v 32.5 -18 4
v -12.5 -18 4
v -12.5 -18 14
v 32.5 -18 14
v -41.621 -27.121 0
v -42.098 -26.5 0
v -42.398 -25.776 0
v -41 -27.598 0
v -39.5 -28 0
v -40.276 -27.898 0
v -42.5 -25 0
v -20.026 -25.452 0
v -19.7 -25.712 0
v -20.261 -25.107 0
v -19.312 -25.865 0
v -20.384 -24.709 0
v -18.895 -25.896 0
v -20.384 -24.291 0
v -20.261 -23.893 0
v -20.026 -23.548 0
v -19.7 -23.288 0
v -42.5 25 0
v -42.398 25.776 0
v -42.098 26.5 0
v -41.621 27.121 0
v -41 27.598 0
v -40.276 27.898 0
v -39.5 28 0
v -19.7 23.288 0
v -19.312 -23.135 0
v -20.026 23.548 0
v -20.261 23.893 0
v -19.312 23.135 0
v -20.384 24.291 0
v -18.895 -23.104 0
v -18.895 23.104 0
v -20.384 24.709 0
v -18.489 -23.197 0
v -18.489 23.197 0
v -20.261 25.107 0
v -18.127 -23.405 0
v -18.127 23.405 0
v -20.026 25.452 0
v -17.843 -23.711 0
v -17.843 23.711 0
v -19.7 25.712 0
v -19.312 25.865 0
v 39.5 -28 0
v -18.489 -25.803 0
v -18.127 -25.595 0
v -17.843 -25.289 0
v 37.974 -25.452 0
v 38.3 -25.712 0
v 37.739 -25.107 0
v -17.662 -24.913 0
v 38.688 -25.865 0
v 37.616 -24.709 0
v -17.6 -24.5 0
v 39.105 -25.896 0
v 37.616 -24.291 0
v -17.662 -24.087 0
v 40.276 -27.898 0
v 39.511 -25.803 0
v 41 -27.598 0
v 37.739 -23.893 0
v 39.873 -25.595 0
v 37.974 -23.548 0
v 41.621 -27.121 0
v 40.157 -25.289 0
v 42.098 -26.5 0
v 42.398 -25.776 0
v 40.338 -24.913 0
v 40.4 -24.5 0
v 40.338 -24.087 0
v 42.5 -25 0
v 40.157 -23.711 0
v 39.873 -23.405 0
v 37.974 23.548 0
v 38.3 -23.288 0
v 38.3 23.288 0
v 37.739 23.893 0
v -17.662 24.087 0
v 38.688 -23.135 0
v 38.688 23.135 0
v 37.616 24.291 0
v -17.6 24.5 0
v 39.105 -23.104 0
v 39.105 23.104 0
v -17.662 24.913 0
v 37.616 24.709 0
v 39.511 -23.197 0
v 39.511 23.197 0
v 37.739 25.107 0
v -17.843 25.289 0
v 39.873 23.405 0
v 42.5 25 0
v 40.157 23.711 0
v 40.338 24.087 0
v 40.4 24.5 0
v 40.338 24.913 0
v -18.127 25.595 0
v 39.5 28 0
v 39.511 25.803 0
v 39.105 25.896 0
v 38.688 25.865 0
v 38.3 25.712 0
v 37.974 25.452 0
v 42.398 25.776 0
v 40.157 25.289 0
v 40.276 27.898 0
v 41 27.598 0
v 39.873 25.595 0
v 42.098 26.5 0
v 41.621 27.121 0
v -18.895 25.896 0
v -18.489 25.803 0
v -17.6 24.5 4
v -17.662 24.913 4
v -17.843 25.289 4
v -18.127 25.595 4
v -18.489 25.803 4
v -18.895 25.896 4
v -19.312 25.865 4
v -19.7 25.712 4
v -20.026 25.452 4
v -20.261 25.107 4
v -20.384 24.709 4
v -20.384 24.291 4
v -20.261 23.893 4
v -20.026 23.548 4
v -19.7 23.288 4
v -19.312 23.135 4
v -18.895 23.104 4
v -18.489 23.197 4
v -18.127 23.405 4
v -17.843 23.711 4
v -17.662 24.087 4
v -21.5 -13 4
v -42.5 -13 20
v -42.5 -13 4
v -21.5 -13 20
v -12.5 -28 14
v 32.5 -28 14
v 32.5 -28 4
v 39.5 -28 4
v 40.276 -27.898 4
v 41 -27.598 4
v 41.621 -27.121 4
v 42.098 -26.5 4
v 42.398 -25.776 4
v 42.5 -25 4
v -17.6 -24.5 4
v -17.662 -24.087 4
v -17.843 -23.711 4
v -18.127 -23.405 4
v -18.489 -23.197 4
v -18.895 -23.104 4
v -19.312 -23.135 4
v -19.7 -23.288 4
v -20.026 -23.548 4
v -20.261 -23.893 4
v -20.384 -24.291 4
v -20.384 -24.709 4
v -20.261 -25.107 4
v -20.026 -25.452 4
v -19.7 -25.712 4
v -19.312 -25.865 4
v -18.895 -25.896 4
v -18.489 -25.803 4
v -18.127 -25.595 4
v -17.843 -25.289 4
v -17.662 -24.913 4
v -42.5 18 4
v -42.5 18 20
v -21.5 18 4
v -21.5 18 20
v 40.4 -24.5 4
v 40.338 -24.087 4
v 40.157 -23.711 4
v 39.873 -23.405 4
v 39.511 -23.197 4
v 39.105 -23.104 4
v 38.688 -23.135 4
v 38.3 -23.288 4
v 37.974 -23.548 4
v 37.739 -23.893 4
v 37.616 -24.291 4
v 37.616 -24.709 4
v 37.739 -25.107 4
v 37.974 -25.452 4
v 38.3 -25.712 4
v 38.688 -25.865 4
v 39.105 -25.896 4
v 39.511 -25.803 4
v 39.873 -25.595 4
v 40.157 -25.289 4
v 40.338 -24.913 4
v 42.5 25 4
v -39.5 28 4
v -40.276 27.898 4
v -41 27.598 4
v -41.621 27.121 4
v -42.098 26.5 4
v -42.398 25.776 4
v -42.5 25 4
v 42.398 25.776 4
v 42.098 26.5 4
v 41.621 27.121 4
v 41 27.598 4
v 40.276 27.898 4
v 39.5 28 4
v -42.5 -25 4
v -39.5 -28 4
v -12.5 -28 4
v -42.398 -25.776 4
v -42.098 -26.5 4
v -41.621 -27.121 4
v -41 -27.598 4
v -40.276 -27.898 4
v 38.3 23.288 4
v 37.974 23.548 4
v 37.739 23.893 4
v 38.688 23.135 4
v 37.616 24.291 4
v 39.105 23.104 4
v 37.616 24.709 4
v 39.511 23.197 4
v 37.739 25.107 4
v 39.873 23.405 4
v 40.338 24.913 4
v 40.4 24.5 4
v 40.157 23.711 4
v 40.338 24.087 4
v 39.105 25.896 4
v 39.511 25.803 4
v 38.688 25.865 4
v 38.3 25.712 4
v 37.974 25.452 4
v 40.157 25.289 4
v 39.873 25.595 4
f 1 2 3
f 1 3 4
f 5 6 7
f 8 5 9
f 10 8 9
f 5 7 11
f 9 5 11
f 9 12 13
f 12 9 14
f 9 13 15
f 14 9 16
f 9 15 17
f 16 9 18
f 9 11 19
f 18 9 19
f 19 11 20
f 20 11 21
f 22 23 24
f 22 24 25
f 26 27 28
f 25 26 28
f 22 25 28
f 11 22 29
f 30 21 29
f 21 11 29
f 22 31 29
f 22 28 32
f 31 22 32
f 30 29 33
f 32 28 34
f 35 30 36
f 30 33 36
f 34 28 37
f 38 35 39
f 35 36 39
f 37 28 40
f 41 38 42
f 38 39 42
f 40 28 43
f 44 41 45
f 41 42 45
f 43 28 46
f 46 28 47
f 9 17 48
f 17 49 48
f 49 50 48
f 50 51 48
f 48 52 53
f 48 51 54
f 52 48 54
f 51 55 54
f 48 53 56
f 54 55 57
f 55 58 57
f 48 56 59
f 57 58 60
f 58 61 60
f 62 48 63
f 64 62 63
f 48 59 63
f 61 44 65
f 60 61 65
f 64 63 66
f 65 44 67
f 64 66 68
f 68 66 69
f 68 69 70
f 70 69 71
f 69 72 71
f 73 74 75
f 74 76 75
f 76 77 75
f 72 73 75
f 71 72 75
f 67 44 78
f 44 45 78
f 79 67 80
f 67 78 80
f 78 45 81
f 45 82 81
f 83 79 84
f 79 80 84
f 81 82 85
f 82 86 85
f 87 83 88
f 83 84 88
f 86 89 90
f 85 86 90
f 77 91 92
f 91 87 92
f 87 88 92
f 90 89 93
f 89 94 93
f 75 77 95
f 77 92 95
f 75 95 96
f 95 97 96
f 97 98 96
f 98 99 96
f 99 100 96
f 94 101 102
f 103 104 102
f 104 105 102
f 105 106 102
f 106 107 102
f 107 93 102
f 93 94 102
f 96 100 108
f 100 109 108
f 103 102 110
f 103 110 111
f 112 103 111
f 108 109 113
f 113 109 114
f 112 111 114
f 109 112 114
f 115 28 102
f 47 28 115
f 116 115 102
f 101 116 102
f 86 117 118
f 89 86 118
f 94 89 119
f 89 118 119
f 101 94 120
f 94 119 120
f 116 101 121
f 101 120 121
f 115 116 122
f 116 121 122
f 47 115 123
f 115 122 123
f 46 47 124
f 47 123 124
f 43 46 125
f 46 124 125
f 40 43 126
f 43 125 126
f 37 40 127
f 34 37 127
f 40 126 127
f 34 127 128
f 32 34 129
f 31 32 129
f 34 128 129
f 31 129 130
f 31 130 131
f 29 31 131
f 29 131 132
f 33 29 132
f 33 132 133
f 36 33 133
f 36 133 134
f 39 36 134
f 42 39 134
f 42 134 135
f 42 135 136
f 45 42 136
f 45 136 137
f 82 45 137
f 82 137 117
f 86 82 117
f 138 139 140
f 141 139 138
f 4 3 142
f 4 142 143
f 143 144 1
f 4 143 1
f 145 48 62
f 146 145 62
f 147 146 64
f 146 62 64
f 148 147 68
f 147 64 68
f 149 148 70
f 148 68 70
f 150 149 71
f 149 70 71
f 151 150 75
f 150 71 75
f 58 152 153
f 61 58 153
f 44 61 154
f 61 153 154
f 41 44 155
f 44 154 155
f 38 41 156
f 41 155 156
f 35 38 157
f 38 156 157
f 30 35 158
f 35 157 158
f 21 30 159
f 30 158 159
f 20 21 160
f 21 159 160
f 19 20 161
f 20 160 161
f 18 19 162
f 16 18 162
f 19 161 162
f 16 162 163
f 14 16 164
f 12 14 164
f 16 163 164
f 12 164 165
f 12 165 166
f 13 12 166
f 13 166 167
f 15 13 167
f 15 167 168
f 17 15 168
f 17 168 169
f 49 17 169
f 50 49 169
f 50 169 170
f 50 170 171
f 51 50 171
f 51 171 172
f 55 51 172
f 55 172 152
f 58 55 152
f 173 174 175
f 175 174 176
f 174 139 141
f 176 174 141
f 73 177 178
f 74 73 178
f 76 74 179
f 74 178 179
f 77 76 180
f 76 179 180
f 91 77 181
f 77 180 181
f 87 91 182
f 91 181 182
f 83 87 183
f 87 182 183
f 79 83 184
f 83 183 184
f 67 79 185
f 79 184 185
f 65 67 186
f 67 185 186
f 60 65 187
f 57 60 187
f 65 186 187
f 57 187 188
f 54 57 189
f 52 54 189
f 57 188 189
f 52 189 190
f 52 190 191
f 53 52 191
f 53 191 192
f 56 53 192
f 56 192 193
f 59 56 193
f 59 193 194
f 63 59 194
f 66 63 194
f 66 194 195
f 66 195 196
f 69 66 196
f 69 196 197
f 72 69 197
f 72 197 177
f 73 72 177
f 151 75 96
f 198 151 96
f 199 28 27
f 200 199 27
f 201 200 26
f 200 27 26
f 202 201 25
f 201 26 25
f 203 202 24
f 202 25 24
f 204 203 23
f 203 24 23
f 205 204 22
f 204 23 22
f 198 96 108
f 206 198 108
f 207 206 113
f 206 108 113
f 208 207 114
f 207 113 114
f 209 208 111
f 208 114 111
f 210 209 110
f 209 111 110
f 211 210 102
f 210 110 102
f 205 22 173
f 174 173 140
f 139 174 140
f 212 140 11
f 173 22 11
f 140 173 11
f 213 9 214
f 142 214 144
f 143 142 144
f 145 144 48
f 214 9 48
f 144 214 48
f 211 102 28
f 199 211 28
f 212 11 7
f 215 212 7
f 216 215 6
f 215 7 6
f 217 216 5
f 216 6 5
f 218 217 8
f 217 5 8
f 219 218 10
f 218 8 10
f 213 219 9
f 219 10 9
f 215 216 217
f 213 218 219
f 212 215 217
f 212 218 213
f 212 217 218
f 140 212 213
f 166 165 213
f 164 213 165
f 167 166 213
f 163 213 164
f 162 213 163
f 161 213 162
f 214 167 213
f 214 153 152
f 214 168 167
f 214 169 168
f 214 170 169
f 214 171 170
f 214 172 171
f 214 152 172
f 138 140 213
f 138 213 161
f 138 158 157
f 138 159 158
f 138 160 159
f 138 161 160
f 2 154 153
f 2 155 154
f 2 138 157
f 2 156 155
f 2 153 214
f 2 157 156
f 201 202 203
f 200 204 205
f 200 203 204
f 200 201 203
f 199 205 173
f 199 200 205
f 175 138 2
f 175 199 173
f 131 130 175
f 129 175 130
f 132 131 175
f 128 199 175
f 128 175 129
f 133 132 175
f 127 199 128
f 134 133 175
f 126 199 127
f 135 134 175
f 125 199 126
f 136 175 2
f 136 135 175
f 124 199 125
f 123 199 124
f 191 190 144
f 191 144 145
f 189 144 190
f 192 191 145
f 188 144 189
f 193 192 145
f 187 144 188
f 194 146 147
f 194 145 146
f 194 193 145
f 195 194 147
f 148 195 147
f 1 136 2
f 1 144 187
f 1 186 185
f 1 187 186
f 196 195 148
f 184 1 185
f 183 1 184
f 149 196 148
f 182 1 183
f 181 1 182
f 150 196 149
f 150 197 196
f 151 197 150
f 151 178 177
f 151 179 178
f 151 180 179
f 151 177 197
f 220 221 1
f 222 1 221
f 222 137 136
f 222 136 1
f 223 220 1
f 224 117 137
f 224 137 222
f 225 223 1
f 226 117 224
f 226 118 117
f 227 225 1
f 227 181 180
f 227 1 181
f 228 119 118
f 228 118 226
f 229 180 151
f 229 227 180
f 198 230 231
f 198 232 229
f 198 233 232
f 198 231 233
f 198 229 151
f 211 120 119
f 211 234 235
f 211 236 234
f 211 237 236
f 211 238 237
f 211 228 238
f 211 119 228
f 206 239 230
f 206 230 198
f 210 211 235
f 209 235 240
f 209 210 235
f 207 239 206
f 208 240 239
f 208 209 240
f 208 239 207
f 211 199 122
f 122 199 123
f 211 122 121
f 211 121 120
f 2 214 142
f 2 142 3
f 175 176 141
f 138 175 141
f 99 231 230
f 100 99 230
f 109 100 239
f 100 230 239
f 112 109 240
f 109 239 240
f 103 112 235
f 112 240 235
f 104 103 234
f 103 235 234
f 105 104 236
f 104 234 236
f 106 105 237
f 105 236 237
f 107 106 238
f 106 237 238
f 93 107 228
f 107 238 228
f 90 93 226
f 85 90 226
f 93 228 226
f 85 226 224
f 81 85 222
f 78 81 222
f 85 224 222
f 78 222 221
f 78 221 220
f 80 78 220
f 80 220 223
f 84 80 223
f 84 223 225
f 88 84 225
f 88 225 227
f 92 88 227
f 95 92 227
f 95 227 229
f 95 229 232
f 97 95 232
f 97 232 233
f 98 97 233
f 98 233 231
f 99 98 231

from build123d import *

# Parameters (mm, degrees)
F1_DEPTH = 20
F2_R     = 1.4
F3_DEPTH = 25
F4_W     = 21
F4_H     = 10
F4_H_2   = 15
F5_DEPTH = 16
F6_W     = 45
F6_H     = 10
F7_DEPTH = 10


with BuildPart() as f1:
    # F0 (on Top) → F1 (new body)
    with BuildSketch(Plane.XY):
        with BuildLine():
            Line((-39.5, -28), (39.5, -28))
            ThreePointArc((39.5, -28), (41.62132, -27.12132), (42.5, -25))
            Line((42.5, -25), (42.5, 25))
            ThreePointArc((42.5, 25), (41.62132, 27.12132), (39.5, 28))
            Line((39.5, 28), (-39.5, 28))
            ThreePointArc((-39.5, 28), (-41.62132, 27.12132), (-42.5, 25))
            Line((-42.5, 25), (-42.5, -25))
            ThreePointArc((-42.5, -25), (-41.62132, -27.12132), (-39.5, -28))
        make_face()
    extrude(amount=F1_DEPTH)

    # F2 (on face) → F3 (cut)
    with BuildSketch(Plane.XY.offset(20)):
        with Locations((-19, 24.5)):
            Circle(F2_R)
        with Locations((39, 24.5)):
            Circle(F2_R)
        with Locations((-19, -24.5)):
            Circle(F2_R)
        with Locations((39, -24.5)):
            Circle(F2_R)
    extrude(amount=-F3_DEPTH, mode=Mode.SUBTRACT)

    # F4 (on face) → F5 (cut)
    with BuildSketch(Plane.XY.offset(20)):
        Polygon((42.5, -28), (42.5, 28), (-21.5, 28), (-21.5, 18), (-21.5, -13), (-21.5, -28), align=None)
        with Locations((-32, 23)):
            Rectangle(F4_W, F4_H)
        with Locations((-32, -20.5)):
            Rectangle(F4_W, F4_H_2)
    extrude(amount=-F5_DEPTH, mode=Mode.SUBTRACT)

    # F6 (on face) → F7 (join)
    with BuildSketch(Plane.XY.offset(4)):
        with Locations((10, -23)):
            Rectangle(F6_W, F6_H)
    extrude(amount=F7_DEPTH)


solid = f1.part
